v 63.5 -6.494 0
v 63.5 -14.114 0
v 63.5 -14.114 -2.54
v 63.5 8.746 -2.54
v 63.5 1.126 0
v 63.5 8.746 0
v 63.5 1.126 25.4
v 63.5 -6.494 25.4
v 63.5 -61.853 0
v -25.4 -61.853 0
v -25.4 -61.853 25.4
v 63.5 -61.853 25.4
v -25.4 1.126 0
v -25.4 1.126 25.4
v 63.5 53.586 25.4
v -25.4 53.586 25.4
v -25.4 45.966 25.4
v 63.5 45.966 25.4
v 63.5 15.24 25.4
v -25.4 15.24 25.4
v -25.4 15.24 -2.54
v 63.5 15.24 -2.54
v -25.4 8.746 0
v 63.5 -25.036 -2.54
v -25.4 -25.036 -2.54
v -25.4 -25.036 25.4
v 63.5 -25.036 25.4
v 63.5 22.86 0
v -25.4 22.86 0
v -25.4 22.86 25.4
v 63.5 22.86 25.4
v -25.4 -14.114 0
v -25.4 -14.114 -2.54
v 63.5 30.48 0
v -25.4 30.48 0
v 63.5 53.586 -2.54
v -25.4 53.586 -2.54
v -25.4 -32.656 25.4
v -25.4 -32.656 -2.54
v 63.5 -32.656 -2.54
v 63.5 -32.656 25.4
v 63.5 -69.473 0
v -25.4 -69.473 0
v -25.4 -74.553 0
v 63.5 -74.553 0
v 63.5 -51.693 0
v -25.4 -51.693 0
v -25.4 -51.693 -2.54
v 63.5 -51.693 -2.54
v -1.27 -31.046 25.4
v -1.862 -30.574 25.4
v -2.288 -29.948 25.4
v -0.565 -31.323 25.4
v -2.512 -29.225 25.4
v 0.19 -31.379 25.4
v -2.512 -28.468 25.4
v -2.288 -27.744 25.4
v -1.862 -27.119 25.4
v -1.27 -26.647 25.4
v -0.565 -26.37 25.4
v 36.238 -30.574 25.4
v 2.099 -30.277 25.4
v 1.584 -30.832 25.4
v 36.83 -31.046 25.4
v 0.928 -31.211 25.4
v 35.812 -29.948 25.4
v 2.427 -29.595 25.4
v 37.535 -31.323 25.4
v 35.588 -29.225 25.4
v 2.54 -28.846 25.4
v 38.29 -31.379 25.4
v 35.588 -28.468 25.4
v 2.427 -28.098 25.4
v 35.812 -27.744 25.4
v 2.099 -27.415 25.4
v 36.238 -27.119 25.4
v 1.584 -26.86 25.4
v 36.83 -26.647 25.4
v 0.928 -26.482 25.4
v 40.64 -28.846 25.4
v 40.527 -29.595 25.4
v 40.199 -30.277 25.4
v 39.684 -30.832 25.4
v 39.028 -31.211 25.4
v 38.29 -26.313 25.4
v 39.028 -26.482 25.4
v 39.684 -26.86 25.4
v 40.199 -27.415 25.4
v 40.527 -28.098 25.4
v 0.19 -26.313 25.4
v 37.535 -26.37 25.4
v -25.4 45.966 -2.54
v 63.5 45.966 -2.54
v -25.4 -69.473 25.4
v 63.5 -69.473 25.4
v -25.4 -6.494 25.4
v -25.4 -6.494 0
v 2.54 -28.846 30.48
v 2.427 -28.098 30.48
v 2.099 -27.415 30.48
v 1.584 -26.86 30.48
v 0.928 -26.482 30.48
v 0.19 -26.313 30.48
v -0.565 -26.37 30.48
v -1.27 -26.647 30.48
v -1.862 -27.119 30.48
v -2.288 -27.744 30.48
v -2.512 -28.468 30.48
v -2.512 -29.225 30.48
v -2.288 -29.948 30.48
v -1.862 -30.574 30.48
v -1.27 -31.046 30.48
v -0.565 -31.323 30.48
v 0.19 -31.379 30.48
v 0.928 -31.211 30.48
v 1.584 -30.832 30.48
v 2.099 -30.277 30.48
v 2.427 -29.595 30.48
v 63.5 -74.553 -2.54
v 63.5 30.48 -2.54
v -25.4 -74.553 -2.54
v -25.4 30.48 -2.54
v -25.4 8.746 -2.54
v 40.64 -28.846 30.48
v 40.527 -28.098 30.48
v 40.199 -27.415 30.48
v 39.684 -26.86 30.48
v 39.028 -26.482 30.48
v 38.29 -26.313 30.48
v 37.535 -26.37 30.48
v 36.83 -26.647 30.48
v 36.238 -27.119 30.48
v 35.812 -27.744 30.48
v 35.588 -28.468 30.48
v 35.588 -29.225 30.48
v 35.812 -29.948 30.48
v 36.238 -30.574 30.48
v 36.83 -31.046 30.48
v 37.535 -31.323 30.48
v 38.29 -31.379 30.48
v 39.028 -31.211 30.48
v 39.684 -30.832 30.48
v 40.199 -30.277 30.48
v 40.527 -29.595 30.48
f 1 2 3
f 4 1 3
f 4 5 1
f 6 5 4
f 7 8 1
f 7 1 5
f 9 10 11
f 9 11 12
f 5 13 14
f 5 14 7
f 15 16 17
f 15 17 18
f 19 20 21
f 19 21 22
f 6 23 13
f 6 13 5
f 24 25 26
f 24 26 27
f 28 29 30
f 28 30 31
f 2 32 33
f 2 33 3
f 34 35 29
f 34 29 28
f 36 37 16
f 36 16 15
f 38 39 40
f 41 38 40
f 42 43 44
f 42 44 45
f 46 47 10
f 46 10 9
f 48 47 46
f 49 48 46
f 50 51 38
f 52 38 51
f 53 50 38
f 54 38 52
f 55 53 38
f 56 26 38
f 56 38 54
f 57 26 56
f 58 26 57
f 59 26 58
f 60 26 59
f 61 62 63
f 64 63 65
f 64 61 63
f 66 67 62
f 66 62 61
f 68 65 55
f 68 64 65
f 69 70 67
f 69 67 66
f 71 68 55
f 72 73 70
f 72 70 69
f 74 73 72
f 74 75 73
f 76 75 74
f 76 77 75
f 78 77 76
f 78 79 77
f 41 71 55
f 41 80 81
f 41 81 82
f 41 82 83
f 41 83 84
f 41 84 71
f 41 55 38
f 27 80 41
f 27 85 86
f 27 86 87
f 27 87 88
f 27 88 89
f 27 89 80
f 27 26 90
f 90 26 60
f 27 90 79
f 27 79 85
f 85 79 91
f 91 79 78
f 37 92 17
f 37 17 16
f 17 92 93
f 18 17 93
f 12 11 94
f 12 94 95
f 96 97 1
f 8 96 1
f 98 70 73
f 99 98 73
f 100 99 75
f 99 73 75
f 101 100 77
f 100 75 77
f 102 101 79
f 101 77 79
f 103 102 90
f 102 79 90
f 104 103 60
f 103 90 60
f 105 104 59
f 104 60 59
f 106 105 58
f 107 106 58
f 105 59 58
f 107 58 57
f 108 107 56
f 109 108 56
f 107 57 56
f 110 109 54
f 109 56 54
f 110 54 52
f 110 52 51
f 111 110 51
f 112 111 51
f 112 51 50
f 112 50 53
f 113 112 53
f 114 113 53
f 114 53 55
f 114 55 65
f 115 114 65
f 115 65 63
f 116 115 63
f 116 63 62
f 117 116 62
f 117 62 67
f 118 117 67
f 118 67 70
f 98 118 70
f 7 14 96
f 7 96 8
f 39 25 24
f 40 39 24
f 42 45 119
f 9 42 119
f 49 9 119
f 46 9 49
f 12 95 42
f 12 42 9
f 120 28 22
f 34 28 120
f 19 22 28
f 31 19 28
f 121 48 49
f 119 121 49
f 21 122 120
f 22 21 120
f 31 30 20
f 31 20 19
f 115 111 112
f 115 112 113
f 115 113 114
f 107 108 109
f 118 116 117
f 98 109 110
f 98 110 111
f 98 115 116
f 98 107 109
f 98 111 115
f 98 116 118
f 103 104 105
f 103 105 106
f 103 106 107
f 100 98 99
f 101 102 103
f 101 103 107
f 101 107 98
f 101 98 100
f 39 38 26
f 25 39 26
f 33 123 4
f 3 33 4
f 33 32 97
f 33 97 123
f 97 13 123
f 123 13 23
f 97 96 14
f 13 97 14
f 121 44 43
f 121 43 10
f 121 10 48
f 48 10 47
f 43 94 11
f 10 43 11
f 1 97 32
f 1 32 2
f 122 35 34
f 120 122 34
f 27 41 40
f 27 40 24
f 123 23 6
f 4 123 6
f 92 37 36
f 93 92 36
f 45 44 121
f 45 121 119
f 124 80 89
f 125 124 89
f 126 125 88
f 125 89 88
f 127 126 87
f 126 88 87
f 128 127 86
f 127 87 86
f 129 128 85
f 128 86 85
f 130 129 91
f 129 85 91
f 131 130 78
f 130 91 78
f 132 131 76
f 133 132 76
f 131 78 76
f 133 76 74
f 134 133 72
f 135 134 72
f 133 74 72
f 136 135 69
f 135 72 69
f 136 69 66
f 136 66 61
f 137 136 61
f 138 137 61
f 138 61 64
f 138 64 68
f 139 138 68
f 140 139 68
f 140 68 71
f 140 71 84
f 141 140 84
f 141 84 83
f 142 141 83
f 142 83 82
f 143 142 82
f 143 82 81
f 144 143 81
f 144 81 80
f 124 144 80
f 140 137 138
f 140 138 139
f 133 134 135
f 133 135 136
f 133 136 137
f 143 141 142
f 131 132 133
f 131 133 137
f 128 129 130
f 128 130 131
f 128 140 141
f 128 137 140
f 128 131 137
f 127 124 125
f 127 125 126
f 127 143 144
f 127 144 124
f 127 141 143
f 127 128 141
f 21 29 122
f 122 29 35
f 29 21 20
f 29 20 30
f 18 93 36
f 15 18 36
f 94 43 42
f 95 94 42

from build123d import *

# Parameters (mm, degrees)
F0_W     = 88.9
F0_H     = 7.62
F1_DEPTH = 25.4
F2_W     = 88.9
F2_H     = 15.24
F2_H_2   = 22.86
F3_DEPTH = 2.54
F5_W     = 88.9
F5_H     = 7.62
F6_DEPTH = 27.94
F7_R     = 2.54
F8_DEPTH = 30.48


with BuildPart() as f1:
    # F0 (on Top) → F1 (new body)
    with BuildSketch(Plane.XY):
        with Locations((19.05, 19.05)):
            Rectangle(F0_W, F0_H)
        with Locations((19.05, -2.68392)):
            Rectangle(F0_W, F0_H)
        with Locations((19.05, -65.662693)):
            Rectangle(F0_W, F0_H)
    extrude(amount=F1_DEPTH)

    # F2 (on Top) → F3 (join)
    with BuildSketch(Plane.XY):
        with Locations((19.05, 22.86)):
            Rectangle(F2_W, F2_H)
        with Locations((19.05, -2.68392)):
            Rectangle(F2_W, F2_H_2)
        with Locations((19.05, -63.122693)):
            Rectangle(F2_W, F2_H_2)
    extrude(amount=-F3_DEPTH)


with BuildPart() as f6:
    # F5 (on offset) → F6 (new body)
    with BuildSketch(Plane.XY.offset(-2.54)):
        with Locations((19.05, -28.84625)):
            Rectangle(F5_W, F5_H)
        with Locations((19.05, 49.776015)):
            Rectangle(F5_W, F5_H)
    extrude(amount=F6_DEPTH)

    # F7 (on Top) → F8 (join)
    with BuildSketch(Plane.XY):
        with Locations((38.1, -28.84625)):
            Circle(F7_R)
        with Locations((0, -28.84625)):
            Circle(F7_R)
    extrude(amount=F8_DEPTH)


solid = Compound([f1.part, f6.part])
